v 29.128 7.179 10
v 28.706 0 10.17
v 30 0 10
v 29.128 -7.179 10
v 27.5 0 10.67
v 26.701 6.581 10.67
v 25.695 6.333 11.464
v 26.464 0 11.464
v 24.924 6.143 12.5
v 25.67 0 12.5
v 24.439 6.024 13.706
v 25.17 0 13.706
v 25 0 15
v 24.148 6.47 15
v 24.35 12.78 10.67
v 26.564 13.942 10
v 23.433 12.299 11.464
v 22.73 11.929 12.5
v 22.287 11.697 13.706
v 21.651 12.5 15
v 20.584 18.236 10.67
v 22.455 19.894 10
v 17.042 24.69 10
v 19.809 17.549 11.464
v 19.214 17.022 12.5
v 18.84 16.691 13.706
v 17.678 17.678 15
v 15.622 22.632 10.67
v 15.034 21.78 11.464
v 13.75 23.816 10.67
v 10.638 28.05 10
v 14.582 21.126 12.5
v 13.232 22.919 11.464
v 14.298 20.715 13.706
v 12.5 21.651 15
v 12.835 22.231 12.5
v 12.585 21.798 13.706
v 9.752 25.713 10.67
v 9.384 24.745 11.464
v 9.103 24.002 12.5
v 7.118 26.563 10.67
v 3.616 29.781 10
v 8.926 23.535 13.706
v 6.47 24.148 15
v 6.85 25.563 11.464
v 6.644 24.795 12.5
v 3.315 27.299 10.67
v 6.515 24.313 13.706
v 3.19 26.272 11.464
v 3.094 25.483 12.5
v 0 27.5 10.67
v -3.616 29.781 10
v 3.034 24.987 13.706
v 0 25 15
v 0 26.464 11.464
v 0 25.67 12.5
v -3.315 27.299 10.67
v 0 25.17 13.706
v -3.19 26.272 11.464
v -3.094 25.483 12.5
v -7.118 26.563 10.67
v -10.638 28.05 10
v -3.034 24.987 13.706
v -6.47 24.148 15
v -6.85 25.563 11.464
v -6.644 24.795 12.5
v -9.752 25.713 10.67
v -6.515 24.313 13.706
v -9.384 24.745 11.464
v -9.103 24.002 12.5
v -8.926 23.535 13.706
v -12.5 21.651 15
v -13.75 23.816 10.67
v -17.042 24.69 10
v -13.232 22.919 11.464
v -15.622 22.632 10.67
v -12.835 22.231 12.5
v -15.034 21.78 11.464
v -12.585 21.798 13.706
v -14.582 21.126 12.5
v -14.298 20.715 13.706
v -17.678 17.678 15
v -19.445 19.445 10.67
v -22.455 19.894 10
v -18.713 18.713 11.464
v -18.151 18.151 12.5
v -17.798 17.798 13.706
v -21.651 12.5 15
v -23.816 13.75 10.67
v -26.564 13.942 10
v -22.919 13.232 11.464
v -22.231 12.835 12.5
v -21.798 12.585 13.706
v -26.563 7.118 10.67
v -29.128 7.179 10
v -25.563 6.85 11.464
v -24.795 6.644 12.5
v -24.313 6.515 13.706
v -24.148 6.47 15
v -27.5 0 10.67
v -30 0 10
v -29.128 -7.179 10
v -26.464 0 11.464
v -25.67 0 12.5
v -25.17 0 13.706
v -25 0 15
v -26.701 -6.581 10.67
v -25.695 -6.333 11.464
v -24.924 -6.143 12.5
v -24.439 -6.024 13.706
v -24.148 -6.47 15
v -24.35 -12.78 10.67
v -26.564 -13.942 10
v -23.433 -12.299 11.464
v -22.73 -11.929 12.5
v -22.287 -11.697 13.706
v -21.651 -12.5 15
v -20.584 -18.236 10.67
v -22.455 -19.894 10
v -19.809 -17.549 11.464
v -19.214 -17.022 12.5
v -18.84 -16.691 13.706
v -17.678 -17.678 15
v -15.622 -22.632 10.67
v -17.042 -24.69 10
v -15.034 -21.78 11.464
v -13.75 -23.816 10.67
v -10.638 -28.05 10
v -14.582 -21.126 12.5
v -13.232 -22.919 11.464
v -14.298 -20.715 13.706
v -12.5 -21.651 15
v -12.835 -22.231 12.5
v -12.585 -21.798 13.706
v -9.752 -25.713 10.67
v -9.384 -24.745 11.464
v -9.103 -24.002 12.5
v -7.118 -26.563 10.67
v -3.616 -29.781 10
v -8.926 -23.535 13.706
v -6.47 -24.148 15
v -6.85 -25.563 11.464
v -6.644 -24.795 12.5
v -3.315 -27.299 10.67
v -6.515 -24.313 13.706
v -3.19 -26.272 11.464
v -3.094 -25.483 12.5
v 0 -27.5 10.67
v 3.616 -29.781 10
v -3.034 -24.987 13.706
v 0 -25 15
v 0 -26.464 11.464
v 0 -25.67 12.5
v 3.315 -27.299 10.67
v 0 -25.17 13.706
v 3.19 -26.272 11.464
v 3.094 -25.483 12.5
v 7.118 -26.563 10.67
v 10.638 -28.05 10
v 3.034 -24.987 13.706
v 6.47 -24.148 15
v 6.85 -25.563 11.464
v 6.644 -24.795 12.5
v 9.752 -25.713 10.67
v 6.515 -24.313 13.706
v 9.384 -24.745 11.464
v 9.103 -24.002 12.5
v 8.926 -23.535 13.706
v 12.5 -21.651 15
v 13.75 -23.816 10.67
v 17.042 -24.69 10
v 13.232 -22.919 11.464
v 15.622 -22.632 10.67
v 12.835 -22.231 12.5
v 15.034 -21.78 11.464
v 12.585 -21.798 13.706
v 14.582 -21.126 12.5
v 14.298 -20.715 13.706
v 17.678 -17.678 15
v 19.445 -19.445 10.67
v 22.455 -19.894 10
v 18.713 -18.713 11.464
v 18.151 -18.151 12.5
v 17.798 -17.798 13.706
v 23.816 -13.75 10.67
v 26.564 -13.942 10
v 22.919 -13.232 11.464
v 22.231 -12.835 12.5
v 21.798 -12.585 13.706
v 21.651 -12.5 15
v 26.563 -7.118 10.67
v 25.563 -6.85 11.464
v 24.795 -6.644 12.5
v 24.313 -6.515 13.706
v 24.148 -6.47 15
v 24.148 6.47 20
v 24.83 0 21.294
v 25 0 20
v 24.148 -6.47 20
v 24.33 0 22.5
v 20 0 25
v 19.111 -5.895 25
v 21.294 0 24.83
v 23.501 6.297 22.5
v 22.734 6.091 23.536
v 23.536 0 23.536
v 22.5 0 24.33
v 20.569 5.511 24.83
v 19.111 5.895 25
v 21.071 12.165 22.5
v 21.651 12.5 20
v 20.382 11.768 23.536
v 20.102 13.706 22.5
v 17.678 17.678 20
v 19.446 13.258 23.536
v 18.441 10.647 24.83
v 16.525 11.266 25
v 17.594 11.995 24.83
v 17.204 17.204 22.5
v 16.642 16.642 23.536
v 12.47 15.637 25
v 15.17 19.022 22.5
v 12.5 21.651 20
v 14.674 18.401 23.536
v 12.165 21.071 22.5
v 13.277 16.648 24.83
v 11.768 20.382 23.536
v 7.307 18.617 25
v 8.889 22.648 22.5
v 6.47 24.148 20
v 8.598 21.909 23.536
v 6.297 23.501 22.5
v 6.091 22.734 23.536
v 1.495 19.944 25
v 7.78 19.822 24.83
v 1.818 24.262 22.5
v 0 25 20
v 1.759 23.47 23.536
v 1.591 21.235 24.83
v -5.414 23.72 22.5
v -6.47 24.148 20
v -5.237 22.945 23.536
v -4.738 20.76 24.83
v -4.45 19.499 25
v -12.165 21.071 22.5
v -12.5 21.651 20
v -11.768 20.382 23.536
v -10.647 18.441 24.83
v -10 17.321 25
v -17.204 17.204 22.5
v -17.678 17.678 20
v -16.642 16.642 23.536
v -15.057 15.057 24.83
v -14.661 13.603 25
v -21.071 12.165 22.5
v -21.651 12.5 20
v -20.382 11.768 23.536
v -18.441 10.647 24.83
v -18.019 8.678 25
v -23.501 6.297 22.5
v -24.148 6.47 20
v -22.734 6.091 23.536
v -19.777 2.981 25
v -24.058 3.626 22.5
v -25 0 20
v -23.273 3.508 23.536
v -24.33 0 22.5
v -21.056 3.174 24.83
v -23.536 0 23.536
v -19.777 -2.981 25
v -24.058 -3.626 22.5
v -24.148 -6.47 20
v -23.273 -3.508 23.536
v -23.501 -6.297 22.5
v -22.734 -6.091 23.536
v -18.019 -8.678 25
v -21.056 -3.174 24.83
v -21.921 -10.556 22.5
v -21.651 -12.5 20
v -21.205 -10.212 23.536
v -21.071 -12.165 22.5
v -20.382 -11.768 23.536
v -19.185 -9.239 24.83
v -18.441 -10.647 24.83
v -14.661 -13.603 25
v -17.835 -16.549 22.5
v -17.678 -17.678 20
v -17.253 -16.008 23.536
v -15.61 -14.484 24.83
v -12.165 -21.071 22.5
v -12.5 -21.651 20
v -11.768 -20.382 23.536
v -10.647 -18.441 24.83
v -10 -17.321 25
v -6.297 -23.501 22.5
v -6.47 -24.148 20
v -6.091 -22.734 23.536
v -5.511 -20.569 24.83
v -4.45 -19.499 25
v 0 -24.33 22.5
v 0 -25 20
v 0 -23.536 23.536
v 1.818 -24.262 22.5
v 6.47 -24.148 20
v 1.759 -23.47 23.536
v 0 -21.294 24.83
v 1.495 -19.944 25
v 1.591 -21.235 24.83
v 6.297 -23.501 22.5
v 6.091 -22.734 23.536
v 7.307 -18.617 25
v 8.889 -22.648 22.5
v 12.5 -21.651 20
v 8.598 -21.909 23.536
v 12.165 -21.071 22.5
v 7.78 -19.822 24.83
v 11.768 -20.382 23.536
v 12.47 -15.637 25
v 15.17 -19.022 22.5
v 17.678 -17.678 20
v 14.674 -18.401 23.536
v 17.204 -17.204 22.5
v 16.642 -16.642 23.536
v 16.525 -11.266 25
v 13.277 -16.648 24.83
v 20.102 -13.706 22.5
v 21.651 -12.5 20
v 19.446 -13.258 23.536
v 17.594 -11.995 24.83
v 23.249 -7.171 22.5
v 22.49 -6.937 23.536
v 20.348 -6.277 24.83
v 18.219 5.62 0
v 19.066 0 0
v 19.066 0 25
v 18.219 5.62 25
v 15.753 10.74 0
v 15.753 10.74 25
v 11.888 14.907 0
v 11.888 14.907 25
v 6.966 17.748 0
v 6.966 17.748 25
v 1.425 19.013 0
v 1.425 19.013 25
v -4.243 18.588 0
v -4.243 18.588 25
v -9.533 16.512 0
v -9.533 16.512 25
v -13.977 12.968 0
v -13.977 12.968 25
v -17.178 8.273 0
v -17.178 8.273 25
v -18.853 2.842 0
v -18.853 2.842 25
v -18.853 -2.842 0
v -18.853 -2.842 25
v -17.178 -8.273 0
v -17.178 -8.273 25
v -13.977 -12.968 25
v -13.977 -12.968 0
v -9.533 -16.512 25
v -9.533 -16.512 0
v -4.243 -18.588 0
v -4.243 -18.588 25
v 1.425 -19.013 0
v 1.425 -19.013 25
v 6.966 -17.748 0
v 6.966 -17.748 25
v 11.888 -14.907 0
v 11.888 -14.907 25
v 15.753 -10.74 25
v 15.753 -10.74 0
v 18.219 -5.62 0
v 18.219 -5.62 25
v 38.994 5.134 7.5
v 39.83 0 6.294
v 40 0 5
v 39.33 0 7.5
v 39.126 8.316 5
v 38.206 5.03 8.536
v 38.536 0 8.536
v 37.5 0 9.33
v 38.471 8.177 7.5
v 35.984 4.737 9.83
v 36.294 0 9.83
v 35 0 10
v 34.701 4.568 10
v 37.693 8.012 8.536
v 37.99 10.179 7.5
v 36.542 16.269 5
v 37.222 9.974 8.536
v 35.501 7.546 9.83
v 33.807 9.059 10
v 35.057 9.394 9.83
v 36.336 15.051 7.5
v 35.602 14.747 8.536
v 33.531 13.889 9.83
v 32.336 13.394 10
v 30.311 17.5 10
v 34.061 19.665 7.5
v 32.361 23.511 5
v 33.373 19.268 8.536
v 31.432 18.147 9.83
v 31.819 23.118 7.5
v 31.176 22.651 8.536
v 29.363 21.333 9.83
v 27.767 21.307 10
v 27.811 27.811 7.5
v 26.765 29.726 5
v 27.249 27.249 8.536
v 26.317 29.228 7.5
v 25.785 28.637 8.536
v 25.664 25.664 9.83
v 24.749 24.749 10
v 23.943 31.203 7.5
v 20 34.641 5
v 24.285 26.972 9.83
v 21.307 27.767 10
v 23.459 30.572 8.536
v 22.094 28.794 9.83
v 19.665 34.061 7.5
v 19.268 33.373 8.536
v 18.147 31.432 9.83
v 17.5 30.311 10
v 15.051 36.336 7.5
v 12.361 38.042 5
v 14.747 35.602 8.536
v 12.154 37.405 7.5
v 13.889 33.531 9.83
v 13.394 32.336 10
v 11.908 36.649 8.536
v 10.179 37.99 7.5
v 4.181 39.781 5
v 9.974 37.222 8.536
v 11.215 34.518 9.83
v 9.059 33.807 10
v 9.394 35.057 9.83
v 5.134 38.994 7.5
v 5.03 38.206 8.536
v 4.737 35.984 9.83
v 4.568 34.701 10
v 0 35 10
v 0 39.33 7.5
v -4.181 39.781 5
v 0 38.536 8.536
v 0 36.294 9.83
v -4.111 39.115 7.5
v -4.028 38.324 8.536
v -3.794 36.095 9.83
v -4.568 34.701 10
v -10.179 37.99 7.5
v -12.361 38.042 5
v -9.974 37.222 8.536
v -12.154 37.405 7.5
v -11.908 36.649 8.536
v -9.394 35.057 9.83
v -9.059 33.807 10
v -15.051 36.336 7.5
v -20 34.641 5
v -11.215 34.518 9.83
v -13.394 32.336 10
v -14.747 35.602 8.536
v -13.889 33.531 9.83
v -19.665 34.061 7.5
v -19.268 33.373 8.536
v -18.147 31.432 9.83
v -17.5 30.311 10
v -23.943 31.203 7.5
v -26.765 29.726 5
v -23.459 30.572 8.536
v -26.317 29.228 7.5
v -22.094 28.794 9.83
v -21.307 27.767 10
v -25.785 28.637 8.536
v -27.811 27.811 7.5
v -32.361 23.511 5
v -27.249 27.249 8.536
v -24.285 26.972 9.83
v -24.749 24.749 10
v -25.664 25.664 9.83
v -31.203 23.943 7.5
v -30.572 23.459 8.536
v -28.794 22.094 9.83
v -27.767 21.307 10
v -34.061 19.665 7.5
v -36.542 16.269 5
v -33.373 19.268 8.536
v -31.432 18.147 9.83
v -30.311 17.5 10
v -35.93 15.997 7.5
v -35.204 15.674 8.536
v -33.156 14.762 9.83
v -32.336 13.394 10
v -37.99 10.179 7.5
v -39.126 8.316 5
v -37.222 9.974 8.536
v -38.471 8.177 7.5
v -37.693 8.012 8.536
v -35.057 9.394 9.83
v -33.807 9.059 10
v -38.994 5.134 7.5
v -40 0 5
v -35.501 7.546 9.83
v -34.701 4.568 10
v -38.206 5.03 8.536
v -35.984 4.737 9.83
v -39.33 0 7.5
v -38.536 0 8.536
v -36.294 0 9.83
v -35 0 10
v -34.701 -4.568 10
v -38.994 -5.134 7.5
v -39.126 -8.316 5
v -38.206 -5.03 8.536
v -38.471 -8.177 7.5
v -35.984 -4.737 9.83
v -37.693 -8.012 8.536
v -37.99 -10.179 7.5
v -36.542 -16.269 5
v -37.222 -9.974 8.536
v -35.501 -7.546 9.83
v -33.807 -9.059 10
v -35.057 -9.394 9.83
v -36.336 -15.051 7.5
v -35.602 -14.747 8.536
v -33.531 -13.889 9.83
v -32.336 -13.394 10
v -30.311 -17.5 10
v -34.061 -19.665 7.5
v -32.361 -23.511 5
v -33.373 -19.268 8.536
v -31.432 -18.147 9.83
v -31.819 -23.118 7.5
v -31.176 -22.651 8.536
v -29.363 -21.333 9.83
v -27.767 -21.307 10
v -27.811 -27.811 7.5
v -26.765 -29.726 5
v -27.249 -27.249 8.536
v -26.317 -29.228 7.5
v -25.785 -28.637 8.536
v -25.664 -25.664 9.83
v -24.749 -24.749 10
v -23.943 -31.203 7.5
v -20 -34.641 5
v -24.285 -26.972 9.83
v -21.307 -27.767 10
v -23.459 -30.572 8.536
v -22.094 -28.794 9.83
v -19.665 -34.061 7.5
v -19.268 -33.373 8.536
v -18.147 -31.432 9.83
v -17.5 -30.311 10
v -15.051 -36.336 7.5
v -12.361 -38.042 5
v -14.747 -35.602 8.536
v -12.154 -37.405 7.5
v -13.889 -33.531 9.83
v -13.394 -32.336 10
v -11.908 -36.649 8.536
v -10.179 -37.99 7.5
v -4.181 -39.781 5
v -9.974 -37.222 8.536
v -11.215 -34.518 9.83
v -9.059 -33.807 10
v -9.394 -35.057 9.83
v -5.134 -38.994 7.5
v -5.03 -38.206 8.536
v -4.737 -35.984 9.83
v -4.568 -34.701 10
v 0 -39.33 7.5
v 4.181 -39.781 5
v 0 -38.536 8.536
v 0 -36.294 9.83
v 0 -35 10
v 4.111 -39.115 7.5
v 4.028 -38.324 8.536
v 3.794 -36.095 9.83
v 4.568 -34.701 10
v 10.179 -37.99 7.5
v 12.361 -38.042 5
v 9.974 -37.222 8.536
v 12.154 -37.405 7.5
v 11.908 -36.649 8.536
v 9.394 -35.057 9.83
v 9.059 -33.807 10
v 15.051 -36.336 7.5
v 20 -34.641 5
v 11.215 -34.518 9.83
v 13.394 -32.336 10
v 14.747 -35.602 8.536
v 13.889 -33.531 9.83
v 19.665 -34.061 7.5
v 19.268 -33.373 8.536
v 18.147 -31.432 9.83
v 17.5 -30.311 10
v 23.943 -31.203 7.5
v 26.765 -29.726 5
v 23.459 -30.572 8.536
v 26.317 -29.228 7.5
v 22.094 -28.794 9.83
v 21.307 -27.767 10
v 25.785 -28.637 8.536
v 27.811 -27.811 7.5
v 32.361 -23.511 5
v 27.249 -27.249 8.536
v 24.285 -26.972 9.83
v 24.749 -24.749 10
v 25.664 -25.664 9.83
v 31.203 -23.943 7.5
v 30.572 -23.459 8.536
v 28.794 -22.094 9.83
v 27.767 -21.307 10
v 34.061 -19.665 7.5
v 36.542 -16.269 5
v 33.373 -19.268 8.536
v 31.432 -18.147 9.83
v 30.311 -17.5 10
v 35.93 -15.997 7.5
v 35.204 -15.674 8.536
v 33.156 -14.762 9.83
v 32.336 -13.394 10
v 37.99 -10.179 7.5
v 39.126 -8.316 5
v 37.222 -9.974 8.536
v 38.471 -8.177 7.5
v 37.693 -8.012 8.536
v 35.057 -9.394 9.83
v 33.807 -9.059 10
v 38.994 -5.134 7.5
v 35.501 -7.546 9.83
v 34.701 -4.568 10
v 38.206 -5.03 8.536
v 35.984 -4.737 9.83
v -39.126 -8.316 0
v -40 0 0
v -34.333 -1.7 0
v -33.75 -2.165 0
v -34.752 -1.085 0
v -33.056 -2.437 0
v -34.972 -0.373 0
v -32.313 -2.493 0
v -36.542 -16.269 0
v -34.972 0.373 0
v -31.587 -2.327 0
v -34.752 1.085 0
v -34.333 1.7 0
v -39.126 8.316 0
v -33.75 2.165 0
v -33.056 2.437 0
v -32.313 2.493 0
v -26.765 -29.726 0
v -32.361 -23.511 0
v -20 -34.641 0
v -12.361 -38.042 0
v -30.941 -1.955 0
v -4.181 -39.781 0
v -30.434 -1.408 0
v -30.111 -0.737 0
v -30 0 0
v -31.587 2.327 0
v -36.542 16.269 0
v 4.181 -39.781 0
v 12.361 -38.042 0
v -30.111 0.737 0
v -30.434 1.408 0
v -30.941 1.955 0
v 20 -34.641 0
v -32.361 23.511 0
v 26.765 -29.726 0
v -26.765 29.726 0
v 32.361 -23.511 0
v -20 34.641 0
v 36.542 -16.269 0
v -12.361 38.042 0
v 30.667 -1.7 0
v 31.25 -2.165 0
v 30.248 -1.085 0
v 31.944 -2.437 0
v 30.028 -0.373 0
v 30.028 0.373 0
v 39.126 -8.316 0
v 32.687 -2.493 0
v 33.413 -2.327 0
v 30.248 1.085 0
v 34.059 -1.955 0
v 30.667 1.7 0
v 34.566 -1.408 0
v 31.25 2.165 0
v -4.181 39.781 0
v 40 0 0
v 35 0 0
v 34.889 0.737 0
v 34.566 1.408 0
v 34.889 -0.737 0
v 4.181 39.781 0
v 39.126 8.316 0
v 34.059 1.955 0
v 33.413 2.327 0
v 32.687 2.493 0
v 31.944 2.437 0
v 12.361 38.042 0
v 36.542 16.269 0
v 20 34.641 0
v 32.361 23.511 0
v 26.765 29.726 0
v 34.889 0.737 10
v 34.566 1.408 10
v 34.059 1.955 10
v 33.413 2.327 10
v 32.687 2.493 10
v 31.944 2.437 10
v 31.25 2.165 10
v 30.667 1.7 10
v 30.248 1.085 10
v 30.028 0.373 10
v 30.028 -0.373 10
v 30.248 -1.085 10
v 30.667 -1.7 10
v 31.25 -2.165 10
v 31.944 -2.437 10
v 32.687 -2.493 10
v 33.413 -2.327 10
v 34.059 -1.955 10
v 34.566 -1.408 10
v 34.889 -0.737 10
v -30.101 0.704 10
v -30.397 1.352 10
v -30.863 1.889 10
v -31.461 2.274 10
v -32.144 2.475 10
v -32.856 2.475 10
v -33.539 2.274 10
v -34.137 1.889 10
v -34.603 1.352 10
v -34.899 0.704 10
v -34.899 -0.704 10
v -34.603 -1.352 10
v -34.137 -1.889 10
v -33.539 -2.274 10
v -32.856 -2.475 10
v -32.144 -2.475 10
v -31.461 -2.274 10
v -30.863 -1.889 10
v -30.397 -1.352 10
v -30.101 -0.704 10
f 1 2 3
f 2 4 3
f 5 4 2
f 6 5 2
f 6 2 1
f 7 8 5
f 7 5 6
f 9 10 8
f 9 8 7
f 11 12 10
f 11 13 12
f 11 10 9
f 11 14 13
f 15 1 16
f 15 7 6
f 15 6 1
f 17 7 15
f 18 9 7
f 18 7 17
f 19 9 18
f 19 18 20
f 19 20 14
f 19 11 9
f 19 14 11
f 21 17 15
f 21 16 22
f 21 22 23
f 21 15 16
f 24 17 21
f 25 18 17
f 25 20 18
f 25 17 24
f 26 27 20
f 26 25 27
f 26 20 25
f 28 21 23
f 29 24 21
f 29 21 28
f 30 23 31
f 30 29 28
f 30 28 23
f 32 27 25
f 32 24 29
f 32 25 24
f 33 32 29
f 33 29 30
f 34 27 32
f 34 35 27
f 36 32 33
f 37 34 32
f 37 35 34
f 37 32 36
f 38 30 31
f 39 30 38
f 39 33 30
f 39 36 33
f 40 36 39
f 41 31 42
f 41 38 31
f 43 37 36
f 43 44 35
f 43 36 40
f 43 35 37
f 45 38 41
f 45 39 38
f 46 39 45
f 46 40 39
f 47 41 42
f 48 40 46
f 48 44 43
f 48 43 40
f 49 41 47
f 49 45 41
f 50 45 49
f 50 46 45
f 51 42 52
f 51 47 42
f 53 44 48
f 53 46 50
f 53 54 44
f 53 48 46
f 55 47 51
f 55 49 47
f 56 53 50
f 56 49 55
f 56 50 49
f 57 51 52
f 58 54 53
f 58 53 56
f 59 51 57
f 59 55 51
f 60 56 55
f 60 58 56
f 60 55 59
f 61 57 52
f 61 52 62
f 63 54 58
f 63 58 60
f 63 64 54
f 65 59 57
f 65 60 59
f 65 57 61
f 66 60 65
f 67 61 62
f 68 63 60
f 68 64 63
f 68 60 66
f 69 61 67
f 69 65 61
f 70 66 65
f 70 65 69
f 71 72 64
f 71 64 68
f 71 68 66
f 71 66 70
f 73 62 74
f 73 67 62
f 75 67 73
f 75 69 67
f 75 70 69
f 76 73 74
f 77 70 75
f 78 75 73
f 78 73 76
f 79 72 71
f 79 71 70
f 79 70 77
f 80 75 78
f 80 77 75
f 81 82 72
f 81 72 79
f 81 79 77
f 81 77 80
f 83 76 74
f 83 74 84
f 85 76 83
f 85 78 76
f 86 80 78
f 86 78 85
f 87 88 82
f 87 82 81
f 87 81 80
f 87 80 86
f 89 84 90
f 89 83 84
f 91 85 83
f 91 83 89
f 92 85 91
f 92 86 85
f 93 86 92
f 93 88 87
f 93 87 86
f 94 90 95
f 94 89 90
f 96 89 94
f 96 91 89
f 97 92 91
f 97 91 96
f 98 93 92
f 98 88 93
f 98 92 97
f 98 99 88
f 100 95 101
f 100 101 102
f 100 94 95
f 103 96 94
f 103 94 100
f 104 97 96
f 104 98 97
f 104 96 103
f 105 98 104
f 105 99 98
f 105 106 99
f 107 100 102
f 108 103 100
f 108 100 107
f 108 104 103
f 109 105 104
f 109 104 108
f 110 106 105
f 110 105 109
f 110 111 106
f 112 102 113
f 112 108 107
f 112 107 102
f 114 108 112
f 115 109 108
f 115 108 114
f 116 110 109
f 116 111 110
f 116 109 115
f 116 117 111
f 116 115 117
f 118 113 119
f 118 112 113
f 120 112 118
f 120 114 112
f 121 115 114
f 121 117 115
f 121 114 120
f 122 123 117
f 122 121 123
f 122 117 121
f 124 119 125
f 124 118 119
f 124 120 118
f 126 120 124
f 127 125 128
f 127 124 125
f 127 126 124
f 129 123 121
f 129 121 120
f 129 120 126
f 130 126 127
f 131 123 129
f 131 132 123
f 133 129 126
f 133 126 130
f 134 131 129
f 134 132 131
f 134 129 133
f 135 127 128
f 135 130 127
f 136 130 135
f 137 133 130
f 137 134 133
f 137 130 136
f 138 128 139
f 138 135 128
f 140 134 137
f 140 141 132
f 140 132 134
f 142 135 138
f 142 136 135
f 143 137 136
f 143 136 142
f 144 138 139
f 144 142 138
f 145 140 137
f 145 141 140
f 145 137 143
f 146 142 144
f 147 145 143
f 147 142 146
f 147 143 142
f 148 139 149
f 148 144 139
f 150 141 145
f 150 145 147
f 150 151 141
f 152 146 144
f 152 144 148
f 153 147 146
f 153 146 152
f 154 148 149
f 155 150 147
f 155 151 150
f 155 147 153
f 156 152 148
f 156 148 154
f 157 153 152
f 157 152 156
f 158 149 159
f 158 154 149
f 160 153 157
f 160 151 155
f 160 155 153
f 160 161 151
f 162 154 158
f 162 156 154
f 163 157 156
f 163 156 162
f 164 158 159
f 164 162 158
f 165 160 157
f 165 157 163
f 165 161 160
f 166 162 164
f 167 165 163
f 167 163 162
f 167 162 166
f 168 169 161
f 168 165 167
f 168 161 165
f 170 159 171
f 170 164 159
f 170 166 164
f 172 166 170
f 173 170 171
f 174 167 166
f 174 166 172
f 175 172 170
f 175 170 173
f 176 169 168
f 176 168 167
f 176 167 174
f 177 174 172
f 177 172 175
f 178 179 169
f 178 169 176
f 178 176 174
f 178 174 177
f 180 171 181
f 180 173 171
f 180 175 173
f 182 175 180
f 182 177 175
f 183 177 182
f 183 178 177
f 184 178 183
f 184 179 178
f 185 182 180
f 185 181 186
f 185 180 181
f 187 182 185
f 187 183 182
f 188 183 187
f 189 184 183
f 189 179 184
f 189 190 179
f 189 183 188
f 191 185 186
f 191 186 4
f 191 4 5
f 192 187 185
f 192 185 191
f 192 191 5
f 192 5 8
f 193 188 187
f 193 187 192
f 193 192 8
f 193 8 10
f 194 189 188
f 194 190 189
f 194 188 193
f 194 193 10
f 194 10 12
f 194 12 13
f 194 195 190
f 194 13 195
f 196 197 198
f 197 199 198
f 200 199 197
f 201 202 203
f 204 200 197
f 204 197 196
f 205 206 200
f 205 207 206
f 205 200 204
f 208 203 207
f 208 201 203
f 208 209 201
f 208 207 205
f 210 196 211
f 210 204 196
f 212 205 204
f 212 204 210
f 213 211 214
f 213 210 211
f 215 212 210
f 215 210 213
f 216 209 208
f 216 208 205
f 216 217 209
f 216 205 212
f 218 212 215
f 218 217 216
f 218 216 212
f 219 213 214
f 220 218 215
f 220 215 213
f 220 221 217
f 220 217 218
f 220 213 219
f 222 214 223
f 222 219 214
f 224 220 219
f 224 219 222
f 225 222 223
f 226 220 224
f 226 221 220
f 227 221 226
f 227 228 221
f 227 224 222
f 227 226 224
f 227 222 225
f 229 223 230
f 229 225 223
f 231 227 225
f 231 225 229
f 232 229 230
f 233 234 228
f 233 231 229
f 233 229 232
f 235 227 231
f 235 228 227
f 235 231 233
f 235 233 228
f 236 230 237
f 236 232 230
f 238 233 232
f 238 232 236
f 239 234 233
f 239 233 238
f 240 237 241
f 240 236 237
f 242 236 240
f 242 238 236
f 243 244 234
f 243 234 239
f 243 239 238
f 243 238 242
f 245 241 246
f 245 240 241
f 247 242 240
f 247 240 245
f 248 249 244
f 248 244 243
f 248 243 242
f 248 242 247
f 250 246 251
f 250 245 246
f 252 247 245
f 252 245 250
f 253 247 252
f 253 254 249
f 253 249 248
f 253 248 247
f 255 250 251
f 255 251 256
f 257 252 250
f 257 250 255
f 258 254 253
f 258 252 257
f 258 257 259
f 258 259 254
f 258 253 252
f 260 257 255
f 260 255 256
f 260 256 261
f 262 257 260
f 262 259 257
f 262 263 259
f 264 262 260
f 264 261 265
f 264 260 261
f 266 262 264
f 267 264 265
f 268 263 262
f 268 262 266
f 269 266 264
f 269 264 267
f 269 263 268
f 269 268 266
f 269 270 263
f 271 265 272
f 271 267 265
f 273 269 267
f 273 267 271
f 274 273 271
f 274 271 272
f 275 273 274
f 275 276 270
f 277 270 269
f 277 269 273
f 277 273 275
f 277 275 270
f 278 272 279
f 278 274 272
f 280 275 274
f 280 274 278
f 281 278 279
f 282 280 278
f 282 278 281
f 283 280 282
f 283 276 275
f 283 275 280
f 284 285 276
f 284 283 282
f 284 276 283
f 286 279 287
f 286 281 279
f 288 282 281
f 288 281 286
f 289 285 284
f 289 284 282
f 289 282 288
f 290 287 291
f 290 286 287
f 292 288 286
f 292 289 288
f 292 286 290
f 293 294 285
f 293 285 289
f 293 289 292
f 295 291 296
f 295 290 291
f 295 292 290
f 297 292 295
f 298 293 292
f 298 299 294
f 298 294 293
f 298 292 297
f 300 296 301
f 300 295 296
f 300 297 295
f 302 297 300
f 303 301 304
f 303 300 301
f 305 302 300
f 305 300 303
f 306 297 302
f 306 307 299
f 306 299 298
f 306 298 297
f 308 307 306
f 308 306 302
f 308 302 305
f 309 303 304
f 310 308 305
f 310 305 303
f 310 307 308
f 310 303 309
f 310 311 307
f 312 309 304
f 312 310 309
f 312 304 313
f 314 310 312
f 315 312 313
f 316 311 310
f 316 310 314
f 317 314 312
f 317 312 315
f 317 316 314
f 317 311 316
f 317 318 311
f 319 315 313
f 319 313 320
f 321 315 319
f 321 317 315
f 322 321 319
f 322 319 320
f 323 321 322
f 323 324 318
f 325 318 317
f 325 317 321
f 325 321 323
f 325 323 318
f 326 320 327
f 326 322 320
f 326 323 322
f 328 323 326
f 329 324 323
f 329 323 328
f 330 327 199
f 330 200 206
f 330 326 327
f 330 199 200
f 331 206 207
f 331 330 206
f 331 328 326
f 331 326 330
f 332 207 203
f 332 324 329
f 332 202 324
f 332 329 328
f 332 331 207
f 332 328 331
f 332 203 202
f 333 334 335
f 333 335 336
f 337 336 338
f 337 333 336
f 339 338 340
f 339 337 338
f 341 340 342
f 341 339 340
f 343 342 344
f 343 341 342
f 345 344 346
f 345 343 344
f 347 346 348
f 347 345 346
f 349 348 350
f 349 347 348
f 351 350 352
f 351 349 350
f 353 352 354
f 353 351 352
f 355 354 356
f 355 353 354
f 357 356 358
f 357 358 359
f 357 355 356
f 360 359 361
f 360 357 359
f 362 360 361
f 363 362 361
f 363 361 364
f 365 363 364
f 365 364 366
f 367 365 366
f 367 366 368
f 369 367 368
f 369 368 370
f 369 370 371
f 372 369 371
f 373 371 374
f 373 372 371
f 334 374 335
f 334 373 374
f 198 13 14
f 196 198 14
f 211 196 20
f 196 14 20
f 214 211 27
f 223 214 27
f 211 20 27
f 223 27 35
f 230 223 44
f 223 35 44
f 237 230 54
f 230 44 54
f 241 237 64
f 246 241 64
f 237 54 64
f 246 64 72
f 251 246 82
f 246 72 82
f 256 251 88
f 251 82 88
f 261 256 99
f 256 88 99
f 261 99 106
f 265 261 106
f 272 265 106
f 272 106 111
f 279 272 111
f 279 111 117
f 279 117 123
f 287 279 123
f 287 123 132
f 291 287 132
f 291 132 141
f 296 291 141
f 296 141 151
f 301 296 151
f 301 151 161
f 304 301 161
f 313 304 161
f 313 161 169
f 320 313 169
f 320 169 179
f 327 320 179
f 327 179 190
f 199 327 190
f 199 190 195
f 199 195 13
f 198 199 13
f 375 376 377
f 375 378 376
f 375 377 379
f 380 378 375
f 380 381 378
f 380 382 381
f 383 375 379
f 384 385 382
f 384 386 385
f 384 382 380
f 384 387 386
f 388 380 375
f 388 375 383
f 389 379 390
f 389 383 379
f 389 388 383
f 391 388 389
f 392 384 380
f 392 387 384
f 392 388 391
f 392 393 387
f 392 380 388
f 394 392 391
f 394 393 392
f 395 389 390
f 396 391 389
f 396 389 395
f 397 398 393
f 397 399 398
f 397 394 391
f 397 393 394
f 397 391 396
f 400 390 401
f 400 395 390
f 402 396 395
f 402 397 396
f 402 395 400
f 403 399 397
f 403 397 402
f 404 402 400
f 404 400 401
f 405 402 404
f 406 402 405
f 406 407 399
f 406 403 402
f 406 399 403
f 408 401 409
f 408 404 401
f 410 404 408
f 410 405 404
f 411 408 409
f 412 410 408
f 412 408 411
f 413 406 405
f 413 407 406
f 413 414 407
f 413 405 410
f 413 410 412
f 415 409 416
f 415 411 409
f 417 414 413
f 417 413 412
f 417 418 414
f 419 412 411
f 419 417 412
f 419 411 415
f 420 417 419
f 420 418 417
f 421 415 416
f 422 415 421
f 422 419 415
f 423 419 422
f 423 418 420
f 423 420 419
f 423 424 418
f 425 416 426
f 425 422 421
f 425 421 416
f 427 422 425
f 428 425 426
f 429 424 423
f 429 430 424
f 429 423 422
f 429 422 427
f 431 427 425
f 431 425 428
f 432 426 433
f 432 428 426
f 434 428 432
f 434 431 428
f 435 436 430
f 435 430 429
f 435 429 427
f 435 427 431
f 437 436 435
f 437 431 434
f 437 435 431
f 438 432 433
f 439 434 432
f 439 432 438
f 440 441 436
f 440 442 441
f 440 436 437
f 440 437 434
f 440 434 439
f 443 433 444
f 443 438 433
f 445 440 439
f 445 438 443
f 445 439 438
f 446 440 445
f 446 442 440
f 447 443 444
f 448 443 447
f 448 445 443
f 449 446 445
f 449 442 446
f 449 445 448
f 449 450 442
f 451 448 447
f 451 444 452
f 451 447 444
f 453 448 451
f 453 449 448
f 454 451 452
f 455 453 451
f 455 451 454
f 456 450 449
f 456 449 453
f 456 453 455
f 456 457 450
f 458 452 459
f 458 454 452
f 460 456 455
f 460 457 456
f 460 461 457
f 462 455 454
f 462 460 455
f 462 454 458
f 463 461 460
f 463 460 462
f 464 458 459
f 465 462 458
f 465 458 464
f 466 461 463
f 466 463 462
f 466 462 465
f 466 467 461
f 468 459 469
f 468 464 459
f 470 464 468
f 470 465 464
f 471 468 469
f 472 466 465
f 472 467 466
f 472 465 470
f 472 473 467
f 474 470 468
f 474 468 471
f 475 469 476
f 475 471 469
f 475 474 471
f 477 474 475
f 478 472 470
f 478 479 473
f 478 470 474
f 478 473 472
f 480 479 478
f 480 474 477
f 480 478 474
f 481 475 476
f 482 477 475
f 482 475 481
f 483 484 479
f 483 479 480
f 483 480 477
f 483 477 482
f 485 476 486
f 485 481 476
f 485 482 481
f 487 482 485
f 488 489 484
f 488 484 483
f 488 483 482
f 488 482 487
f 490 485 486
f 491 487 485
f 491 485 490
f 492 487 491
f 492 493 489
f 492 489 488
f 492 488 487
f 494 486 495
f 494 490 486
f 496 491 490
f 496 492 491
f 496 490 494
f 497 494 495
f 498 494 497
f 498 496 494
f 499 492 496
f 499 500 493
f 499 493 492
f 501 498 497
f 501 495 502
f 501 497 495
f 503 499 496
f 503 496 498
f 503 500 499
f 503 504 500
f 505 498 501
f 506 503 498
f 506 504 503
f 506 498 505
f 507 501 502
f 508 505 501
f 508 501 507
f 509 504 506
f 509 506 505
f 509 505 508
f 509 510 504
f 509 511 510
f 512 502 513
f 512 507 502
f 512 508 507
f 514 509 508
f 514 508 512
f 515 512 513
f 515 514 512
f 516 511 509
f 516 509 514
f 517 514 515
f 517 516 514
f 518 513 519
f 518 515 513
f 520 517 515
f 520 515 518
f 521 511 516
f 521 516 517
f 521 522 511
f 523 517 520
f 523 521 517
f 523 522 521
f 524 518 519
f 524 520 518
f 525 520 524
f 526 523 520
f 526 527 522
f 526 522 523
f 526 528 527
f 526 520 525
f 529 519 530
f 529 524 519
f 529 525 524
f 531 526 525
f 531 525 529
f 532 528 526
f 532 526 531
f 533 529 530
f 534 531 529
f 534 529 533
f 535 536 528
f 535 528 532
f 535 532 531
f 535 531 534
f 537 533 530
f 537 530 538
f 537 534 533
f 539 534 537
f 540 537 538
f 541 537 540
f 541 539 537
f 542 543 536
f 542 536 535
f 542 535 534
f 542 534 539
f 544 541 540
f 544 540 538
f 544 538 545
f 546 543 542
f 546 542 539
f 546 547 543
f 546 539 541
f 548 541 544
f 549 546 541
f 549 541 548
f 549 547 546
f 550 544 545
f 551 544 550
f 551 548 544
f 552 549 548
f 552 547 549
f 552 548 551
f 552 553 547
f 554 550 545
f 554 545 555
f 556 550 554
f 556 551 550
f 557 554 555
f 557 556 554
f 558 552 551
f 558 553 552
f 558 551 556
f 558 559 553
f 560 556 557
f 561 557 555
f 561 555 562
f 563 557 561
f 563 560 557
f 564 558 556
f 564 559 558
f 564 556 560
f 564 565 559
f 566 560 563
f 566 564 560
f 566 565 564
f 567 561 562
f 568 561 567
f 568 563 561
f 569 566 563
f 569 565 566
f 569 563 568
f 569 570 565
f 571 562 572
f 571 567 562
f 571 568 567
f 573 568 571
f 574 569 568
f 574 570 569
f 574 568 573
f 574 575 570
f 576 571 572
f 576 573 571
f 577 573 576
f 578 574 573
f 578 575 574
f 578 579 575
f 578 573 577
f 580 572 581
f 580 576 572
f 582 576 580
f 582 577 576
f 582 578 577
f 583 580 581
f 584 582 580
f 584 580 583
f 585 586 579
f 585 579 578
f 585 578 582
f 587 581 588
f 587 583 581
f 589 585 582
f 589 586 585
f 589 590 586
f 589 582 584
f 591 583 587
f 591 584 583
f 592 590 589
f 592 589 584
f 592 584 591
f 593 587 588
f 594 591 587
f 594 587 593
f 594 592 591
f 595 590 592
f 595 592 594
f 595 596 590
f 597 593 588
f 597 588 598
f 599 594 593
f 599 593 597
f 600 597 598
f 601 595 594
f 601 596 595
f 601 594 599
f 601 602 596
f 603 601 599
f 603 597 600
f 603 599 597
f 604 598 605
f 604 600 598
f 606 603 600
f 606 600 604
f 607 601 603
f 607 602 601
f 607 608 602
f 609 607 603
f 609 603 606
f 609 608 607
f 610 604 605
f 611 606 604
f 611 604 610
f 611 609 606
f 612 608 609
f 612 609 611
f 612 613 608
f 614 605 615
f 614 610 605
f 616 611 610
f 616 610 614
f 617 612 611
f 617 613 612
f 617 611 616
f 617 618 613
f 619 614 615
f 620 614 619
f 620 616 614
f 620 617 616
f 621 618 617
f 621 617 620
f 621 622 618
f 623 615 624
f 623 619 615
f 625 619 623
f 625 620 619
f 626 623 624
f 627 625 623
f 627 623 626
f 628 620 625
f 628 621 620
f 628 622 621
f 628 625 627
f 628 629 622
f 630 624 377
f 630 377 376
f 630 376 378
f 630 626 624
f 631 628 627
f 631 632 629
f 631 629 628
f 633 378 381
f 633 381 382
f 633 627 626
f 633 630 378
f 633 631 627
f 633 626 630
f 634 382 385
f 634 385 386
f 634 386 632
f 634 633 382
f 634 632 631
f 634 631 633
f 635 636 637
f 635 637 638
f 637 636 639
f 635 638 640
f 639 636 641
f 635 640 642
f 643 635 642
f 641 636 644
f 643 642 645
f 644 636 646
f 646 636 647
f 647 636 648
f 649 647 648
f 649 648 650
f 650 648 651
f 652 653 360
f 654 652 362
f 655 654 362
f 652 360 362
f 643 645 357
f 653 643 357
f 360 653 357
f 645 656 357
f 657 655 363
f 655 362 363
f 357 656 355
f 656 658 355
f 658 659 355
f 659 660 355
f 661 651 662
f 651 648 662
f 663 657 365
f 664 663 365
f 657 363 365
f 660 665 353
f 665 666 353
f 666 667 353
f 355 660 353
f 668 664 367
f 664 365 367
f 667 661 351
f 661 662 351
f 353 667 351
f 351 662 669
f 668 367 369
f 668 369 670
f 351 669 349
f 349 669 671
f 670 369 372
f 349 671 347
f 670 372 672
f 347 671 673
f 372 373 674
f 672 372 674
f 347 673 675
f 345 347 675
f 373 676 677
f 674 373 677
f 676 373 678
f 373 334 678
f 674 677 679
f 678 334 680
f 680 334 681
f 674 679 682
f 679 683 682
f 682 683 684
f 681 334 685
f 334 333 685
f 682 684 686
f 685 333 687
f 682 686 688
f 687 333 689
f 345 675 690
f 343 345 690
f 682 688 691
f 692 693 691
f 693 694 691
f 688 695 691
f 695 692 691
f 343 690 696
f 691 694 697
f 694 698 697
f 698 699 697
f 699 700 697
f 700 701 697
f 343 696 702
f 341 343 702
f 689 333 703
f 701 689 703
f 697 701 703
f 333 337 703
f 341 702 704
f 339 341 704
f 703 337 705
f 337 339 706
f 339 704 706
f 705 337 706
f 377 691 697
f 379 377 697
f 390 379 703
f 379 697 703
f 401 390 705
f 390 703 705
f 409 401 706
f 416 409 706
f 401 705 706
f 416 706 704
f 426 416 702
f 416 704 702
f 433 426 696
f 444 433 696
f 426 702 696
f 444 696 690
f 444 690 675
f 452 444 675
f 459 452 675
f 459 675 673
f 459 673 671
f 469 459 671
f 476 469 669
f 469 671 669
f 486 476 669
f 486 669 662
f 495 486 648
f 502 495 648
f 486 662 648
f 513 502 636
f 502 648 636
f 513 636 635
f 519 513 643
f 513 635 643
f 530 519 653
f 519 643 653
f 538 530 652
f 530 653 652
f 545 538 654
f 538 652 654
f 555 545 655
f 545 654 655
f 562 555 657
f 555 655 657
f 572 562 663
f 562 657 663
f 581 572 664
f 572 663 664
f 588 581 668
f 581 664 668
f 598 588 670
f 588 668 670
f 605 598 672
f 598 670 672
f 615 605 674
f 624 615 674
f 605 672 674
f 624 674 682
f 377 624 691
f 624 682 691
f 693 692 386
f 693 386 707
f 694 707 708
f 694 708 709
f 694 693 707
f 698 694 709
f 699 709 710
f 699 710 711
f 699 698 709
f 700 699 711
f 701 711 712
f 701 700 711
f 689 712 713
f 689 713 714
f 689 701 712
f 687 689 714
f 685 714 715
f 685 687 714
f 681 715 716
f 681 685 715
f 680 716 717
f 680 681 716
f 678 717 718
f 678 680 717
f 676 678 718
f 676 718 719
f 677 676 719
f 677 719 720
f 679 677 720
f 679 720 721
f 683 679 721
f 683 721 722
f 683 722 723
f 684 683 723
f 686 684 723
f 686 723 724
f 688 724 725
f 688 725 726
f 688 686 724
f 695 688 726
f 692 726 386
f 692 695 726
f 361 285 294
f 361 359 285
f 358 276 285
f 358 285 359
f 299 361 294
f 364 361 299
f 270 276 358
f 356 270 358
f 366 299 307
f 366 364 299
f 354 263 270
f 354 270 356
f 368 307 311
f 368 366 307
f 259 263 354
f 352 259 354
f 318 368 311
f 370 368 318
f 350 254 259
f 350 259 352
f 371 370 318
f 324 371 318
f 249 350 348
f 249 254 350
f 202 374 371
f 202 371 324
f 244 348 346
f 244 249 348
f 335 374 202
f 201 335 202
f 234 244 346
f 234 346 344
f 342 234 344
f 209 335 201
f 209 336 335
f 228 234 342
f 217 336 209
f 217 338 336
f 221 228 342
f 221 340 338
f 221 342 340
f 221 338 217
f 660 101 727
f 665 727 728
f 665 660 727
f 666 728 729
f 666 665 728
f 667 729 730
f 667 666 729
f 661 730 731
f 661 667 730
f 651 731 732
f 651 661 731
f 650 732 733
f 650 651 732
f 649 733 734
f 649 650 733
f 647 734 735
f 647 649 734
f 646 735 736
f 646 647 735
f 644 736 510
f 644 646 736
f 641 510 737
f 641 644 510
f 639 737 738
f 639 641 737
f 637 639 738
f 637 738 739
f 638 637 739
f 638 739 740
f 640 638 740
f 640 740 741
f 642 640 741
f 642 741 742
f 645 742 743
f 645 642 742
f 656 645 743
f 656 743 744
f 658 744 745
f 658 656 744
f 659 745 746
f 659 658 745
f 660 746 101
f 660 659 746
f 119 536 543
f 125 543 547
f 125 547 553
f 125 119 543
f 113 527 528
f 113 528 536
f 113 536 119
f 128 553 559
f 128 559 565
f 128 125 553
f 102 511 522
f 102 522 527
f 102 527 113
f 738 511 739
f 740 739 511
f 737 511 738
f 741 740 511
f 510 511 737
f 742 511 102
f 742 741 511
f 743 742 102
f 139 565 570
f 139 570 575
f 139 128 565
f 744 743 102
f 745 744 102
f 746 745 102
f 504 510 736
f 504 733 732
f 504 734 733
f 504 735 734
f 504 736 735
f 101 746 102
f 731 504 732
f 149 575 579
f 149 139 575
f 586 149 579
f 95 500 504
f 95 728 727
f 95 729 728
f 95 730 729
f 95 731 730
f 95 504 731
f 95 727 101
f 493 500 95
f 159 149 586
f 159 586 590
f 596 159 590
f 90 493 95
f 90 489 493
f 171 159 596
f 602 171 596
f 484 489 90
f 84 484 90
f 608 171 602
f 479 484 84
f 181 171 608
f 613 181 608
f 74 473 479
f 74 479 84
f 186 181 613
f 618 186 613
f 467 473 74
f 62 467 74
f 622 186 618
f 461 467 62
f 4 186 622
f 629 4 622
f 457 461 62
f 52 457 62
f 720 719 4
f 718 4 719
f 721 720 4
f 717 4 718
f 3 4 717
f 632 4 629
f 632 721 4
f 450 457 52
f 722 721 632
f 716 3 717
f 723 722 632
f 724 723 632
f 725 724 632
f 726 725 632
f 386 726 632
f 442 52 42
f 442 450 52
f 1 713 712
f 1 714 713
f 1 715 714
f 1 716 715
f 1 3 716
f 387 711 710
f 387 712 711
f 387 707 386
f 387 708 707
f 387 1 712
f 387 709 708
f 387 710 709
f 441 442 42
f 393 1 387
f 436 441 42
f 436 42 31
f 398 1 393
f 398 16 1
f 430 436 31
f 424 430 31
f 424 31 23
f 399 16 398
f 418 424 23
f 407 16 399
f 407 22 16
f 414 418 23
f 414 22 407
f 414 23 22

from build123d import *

# Parameters (mm, degrees)
F0_R     = 25
F0_R_2   = 19.066290696
F1_DEPTH = 25
F0_R_3   = 40
F0_R_4   = 2.5
F2_DEPTH = 10
F3_R     = 4.99999
F4_R     = 4.99999


# Not quite as in the source:
# - a fillet or chamfer is up to 0.001 mm smaller than in the source, because OpenCascade refuses the exact size


with BuildPart() as f1:
    # F0 (on Top) → F1 (new body)
    with BuildSketch(Plane.XY):
        Circle(F0_R)
        Circle(F0_R_2, mode=Mode.SUBTRACT)
    extrude(amount=F1_DEPTH)

    # F0 (on Top) → F2 (join)
    with BuildSketch(Plane.XY):
        Circle(F0_R_3)
        with Locations((-32.5, 0)):
            Circle(F0_R_4, mode=Mode.SUBTRACT)
        Circle(F0_R, mode=Mode.SUBTRACT)
        with Locations((32.5, 0)):
            Circle(F0_R_4, mode=Mode.SUBTRACT)
    extrude(amount=F2_DEPTH)

    # F3 (radius 5 in the source; OpenCascade refuses exactly that, so slightly less here)
    f3_edges = [f1.edges().sort_by_distance(p)[0] for p in [
        (-40, 0, 10),
        (-25, 0, 25),
    ]]
    fillet(f3_edges, radius=F3_R)

    # F4 (radius 5 in the source; OpenCascade refuses exactly that, so slightly less here)
    f4_edges = [f1.edges().sort_by_distance(p)[0] for p in [
        (25, 0, 15.000005),
        (-25, 0, 20.00001),
        (-25, 0, 10),
    ]]
    fillet(f4_edges, radius=F4_R)


solid = f1.part
